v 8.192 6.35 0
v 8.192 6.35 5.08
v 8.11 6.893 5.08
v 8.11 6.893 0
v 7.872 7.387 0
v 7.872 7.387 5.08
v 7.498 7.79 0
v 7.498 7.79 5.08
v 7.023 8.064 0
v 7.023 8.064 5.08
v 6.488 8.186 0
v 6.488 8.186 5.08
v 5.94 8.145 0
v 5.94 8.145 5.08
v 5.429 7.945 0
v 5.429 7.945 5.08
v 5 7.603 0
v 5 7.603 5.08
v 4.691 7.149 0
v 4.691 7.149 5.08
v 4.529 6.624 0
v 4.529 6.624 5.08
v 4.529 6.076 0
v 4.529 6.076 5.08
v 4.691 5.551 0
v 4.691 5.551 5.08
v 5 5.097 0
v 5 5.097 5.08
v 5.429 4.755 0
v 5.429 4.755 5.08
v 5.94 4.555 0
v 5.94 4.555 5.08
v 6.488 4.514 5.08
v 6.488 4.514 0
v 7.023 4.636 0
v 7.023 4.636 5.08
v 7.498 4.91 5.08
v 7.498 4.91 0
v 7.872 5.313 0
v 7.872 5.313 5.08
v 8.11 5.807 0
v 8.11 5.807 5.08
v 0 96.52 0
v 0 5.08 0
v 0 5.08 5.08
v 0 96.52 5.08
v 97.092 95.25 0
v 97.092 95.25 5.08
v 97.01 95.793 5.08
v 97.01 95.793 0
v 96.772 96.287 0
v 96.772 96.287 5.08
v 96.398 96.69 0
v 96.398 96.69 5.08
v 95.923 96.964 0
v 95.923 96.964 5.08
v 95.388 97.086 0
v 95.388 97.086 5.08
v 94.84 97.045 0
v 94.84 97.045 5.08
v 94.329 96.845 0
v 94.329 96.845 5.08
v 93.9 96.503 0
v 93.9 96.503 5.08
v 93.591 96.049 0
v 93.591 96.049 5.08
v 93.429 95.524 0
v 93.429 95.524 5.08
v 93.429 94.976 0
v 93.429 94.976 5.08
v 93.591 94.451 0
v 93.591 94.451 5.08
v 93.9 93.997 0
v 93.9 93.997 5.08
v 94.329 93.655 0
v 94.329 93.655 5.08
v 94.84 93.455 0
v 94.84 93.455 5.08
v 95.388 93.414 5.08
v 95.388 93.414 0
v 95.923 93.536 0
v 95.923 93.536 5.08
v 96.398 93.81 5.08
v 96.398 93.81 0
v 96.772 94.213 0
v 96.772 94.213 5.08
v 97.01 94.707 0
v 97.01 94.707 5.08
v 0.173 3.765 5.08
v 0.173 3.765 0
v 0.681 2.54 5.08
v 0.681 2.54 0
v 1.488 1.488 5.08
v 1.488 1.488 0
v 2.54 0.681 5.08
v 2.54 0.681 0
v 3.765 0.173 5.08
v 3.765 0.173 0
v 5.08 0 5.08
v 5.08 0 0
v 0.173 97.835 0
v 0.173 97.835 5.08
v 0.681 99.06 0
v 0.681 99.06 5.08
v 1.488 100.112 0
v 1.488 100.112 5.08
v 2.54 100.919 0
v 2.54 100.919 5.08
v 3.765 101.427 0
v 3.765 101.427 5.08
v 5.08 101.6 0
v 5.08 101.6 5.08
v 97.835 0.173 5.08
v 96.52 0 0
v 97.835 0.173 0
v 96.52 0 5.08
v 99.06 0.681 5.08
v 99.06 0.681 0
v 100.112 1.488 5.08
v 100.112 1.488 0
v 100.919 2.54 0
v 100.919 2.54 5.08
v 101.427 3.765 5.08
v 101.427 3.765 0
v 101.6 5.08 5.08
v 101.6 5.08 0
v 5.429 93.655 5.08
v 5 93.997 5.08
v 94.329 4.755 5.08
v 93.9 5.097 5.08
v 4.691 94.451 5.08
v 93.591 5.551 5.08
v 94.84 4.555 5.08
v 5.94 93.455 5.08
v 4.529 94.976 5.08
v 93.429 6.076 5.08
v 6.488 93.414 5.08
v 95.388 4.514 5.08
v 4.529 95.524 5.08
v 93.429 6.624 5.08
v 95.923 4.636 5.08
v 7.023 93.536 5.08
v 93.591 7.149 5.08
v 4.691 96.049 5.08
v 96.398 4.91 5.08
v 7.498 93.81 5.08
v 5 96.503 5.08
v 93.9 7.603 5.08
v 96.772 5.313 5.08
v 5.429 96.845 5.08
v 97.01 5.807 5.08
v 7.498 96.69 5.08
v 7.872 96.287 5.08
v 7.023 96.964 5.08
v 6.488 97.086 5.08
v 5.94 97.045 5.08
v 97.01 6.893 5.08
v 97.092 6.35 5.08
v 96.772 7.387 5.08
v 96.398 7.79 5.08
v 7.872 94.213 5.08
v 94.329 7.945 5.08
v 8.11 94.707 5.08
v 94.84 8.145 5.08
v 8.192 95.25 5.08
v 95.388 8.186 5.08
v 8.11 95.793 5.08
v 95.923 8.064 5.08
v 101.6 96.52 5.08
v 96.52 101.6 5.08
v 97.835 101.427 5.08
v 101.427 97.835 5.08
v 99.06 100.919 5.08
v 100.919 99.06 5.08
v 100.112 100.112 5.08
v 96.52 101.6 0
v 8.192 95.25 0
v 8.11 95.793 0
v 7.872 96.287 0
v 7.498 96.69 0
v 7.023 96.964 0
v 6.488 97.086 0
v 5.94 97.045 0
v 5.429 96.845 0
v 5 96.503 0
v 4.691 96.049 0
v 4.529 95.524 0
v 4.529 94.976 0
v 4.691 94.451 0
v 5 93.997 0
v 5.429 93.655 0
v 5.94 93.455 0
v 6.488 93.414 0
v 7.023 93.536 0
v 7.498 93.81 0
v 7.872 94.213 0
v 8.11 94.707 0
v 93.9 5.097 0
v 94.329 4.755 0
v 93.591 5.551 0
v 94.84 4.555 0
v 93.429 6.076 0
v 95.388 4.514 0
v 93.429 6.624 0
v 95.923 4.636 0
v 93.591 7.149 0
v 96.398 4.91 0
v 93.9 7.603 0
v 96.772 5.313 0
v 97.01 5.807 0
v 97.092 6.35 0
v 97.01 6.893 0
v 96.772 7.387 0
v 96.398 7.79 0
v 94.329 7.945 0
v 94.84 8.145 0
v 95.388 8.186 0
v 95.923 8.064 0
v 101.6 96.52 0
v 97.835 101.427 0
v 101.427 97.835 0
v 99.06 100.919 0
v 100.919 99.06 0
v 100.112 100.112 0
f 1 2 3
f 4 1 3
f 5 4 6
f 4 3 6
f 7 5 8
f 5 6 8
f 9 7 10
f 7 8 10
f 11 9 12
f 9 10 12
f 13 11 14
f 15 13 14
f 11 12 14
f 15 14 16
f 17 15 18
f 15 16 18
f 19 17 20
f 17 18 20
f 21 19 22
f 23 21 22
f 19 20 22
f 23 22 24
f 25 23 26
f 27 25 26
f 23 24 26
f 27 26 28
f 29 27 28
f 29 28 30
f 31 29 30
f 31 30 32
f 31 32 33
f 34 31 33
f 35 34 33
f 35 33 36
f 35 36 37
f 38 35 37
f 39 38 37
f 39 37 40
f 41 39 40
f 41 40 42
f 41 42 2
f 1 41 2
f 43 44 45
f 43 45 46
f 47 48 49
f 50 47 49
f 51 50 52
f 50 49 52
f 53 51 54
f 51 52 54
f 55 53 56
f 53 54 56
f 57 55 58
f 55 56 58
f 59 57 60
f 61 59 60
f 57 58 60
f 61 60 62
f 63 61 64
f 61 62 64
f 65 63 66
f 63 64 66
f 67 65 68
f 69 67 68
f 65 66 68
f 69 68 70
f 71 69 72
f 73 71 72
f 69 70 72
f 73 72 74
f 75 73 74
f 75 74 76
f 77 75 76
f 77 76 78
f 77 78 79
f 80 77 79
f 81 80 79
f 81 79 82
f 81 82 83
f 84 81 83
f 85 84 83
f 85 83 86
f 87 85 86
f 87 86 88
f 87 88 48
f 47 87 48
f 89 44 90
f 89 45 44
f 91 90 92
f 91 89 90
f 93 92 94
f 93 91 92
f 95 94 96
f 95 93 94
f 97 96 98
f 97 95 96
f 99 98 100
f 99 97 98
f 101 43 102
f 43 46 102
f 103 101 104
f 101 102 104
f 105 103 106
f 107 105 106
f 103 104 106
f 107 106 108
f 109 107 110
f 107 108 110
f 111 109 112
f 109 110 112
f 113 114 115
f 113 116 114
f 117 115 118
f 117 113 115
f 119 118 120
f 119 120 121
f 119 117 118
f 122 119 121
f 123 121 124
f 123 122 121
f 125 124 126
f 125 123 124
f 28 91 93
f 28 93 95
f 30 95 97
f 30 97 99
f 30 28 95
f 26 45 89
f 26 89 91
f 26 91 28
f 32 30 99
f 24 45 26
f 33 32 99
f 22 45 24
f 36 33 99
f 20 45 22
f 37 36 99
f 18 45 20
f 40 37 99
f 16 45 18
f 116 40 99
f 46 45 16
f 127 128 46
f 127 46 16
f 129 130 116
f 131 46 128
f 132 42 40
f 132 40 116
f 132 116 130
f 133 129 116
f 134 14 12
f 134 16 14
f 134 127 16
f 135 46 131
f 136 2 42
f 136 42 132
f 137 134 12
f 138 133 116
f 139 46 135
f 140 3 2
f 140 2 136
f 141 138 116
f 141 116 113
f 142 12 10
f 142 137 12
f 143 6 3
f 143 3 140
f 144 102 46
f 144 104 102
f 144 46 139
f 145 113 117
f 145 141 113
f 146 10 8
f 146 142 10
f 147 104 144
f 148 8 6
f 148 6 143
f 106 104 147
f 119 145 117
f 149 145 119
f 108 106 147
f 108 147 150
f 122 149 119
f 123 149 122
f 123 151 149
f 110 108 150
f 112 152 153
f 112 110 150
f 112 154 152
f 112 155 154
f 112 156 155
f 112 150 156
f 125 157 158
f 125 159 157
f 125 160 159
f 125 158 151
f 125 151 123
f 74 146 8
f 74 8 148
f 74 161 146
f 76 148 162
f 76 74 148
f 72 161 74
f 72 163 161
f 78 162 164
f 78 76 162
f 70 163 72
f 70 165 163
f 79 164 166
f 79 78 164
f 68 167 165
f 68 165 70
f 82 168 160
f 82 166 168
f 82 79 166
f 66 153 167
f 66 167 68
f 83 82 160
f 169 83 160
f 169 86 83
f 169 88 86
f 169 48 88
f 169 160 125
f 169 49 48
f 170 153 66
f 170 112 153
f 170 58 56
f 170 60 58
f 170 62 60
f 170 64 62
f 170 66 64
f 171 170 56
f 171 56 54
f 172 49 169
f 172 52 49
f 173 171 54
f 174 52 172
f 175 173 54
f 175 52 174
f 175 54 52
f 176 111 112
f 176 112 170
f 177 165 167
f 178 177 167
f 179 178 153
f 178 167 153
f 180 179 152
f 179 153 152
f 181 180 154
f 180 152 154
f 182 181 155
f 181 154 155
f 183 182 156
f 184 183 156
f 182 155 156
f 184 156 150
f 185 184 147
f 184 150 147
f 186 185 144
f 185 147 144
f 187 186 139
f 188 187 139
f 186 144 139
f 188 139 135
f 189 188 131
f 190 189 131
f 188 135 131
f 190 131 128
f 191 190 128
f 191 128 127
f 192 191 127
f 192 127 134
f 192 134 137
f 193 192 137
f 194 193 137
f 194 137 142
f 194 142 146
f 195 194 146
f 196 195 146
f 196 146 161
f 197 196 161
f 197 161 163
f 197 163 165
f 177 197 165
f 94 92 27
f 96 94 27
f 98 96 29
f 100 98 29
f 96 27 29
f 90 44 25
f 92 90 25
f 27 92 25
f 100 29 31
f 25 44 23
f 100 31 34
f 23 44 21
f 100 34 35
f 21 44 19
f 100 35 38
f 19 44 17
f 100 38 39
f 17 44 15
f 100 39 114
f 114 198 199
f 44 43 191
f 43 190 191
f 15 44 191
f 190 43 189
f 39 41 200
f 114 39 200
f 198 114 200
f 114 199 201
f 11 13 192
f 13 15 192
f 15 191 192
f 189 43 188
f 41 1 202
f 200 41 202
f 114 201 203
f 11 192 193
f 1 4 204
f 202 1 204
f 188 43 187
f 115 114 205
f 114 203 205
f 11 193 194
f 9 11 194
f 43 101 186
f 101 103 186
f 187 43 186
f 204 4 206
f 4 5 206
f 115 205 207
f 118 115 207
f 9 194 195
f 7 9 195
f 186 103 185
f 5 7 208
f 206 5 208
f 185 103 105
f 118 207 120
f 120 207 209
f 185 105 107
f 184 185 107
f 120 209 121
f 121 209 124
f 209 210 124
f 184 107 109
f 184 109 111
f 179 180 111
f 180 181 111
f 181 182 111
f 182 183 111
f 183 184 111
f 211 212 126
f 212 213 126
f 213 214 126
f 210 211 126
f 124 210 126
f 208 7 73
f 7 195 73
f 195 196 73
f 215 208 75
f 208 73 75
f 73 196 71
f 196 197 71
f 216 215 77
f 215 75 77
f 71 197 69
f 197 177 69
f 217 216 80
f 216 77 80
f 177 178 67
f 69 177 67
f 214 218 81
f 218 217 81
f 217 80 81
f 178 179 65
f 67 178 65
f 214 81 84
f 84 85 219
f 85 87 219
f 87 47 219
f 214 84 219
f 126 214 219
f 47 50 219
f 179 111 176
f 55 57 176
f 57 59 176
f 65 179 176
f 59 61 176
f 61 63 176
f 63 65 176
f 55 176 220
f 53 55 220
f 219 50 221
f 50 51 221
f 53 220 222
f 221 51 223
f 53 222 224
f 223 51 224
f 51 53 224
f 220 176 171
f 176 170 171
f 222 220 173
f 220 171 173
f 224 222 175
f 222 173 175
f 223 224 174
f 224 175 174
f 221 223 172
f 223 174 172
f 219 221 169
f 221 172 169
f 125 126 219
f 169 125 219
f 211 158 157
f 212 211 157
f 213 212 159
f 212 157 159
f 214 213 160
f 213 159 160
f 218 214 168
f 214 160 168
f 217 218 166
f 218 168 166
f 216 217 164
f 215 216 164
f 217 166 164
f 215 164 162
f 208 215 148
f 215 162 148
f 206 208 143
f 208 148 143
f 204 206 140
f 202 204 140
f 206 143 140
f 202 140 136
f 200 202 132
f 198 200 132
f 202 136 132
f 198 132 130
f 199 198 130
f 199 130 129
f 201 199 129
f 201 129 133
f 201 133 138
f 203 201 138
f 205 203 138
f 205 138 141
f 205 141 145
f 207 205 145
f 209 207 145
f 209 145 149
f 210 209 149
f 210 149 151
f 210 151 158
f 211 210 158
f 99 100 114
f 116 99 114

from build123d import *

# Parameters (mm, degrees)
F0_W     = 101.6
F0_H     = 101.6
F1_DEPTH = 5.08
F2_R     = 1.8415
F3_DEPTH = 5.081
F4_R     = 5.08


with BuildPart() as f1:
    # F0 (on Top) → F1 (new body)
    with BuildSketch(Plane.XY):
        with Locations((50.8, 50.8)):
            Rectangle(F0_W, F0_H)
    extrude(amount=F1_DEPTH)

    # F2 (on face) → F3 (cut, through all)
    with BuildSketch(Plane.XY.offset(5.08)):
        with Locations((6.35, 95.25)):
            Circle(F2_R)
        with Locations((95.25, 95.25)):
            Circle(F2_R)
        with Locations((95.25, 6.35)):
            Circle(F2_R)
        with Locations((6.35, 6.35)):
            Circle(F2_R)
    extrude(amount=-F3_DEPTH, mode=Mode.SUBTRACT)

    # F4
    f4_edges = [f1.edges().sort_by_distance(p)[0] for p in [
        (0, 0, 2.54),
        (101.6, 0, 2.54),
        (101.6, 101.6, 2.54),
        (0, 101.6, 2.54),
    ]]
    fillet(f4_edges, radius=F4_R)


solid = f1.part
